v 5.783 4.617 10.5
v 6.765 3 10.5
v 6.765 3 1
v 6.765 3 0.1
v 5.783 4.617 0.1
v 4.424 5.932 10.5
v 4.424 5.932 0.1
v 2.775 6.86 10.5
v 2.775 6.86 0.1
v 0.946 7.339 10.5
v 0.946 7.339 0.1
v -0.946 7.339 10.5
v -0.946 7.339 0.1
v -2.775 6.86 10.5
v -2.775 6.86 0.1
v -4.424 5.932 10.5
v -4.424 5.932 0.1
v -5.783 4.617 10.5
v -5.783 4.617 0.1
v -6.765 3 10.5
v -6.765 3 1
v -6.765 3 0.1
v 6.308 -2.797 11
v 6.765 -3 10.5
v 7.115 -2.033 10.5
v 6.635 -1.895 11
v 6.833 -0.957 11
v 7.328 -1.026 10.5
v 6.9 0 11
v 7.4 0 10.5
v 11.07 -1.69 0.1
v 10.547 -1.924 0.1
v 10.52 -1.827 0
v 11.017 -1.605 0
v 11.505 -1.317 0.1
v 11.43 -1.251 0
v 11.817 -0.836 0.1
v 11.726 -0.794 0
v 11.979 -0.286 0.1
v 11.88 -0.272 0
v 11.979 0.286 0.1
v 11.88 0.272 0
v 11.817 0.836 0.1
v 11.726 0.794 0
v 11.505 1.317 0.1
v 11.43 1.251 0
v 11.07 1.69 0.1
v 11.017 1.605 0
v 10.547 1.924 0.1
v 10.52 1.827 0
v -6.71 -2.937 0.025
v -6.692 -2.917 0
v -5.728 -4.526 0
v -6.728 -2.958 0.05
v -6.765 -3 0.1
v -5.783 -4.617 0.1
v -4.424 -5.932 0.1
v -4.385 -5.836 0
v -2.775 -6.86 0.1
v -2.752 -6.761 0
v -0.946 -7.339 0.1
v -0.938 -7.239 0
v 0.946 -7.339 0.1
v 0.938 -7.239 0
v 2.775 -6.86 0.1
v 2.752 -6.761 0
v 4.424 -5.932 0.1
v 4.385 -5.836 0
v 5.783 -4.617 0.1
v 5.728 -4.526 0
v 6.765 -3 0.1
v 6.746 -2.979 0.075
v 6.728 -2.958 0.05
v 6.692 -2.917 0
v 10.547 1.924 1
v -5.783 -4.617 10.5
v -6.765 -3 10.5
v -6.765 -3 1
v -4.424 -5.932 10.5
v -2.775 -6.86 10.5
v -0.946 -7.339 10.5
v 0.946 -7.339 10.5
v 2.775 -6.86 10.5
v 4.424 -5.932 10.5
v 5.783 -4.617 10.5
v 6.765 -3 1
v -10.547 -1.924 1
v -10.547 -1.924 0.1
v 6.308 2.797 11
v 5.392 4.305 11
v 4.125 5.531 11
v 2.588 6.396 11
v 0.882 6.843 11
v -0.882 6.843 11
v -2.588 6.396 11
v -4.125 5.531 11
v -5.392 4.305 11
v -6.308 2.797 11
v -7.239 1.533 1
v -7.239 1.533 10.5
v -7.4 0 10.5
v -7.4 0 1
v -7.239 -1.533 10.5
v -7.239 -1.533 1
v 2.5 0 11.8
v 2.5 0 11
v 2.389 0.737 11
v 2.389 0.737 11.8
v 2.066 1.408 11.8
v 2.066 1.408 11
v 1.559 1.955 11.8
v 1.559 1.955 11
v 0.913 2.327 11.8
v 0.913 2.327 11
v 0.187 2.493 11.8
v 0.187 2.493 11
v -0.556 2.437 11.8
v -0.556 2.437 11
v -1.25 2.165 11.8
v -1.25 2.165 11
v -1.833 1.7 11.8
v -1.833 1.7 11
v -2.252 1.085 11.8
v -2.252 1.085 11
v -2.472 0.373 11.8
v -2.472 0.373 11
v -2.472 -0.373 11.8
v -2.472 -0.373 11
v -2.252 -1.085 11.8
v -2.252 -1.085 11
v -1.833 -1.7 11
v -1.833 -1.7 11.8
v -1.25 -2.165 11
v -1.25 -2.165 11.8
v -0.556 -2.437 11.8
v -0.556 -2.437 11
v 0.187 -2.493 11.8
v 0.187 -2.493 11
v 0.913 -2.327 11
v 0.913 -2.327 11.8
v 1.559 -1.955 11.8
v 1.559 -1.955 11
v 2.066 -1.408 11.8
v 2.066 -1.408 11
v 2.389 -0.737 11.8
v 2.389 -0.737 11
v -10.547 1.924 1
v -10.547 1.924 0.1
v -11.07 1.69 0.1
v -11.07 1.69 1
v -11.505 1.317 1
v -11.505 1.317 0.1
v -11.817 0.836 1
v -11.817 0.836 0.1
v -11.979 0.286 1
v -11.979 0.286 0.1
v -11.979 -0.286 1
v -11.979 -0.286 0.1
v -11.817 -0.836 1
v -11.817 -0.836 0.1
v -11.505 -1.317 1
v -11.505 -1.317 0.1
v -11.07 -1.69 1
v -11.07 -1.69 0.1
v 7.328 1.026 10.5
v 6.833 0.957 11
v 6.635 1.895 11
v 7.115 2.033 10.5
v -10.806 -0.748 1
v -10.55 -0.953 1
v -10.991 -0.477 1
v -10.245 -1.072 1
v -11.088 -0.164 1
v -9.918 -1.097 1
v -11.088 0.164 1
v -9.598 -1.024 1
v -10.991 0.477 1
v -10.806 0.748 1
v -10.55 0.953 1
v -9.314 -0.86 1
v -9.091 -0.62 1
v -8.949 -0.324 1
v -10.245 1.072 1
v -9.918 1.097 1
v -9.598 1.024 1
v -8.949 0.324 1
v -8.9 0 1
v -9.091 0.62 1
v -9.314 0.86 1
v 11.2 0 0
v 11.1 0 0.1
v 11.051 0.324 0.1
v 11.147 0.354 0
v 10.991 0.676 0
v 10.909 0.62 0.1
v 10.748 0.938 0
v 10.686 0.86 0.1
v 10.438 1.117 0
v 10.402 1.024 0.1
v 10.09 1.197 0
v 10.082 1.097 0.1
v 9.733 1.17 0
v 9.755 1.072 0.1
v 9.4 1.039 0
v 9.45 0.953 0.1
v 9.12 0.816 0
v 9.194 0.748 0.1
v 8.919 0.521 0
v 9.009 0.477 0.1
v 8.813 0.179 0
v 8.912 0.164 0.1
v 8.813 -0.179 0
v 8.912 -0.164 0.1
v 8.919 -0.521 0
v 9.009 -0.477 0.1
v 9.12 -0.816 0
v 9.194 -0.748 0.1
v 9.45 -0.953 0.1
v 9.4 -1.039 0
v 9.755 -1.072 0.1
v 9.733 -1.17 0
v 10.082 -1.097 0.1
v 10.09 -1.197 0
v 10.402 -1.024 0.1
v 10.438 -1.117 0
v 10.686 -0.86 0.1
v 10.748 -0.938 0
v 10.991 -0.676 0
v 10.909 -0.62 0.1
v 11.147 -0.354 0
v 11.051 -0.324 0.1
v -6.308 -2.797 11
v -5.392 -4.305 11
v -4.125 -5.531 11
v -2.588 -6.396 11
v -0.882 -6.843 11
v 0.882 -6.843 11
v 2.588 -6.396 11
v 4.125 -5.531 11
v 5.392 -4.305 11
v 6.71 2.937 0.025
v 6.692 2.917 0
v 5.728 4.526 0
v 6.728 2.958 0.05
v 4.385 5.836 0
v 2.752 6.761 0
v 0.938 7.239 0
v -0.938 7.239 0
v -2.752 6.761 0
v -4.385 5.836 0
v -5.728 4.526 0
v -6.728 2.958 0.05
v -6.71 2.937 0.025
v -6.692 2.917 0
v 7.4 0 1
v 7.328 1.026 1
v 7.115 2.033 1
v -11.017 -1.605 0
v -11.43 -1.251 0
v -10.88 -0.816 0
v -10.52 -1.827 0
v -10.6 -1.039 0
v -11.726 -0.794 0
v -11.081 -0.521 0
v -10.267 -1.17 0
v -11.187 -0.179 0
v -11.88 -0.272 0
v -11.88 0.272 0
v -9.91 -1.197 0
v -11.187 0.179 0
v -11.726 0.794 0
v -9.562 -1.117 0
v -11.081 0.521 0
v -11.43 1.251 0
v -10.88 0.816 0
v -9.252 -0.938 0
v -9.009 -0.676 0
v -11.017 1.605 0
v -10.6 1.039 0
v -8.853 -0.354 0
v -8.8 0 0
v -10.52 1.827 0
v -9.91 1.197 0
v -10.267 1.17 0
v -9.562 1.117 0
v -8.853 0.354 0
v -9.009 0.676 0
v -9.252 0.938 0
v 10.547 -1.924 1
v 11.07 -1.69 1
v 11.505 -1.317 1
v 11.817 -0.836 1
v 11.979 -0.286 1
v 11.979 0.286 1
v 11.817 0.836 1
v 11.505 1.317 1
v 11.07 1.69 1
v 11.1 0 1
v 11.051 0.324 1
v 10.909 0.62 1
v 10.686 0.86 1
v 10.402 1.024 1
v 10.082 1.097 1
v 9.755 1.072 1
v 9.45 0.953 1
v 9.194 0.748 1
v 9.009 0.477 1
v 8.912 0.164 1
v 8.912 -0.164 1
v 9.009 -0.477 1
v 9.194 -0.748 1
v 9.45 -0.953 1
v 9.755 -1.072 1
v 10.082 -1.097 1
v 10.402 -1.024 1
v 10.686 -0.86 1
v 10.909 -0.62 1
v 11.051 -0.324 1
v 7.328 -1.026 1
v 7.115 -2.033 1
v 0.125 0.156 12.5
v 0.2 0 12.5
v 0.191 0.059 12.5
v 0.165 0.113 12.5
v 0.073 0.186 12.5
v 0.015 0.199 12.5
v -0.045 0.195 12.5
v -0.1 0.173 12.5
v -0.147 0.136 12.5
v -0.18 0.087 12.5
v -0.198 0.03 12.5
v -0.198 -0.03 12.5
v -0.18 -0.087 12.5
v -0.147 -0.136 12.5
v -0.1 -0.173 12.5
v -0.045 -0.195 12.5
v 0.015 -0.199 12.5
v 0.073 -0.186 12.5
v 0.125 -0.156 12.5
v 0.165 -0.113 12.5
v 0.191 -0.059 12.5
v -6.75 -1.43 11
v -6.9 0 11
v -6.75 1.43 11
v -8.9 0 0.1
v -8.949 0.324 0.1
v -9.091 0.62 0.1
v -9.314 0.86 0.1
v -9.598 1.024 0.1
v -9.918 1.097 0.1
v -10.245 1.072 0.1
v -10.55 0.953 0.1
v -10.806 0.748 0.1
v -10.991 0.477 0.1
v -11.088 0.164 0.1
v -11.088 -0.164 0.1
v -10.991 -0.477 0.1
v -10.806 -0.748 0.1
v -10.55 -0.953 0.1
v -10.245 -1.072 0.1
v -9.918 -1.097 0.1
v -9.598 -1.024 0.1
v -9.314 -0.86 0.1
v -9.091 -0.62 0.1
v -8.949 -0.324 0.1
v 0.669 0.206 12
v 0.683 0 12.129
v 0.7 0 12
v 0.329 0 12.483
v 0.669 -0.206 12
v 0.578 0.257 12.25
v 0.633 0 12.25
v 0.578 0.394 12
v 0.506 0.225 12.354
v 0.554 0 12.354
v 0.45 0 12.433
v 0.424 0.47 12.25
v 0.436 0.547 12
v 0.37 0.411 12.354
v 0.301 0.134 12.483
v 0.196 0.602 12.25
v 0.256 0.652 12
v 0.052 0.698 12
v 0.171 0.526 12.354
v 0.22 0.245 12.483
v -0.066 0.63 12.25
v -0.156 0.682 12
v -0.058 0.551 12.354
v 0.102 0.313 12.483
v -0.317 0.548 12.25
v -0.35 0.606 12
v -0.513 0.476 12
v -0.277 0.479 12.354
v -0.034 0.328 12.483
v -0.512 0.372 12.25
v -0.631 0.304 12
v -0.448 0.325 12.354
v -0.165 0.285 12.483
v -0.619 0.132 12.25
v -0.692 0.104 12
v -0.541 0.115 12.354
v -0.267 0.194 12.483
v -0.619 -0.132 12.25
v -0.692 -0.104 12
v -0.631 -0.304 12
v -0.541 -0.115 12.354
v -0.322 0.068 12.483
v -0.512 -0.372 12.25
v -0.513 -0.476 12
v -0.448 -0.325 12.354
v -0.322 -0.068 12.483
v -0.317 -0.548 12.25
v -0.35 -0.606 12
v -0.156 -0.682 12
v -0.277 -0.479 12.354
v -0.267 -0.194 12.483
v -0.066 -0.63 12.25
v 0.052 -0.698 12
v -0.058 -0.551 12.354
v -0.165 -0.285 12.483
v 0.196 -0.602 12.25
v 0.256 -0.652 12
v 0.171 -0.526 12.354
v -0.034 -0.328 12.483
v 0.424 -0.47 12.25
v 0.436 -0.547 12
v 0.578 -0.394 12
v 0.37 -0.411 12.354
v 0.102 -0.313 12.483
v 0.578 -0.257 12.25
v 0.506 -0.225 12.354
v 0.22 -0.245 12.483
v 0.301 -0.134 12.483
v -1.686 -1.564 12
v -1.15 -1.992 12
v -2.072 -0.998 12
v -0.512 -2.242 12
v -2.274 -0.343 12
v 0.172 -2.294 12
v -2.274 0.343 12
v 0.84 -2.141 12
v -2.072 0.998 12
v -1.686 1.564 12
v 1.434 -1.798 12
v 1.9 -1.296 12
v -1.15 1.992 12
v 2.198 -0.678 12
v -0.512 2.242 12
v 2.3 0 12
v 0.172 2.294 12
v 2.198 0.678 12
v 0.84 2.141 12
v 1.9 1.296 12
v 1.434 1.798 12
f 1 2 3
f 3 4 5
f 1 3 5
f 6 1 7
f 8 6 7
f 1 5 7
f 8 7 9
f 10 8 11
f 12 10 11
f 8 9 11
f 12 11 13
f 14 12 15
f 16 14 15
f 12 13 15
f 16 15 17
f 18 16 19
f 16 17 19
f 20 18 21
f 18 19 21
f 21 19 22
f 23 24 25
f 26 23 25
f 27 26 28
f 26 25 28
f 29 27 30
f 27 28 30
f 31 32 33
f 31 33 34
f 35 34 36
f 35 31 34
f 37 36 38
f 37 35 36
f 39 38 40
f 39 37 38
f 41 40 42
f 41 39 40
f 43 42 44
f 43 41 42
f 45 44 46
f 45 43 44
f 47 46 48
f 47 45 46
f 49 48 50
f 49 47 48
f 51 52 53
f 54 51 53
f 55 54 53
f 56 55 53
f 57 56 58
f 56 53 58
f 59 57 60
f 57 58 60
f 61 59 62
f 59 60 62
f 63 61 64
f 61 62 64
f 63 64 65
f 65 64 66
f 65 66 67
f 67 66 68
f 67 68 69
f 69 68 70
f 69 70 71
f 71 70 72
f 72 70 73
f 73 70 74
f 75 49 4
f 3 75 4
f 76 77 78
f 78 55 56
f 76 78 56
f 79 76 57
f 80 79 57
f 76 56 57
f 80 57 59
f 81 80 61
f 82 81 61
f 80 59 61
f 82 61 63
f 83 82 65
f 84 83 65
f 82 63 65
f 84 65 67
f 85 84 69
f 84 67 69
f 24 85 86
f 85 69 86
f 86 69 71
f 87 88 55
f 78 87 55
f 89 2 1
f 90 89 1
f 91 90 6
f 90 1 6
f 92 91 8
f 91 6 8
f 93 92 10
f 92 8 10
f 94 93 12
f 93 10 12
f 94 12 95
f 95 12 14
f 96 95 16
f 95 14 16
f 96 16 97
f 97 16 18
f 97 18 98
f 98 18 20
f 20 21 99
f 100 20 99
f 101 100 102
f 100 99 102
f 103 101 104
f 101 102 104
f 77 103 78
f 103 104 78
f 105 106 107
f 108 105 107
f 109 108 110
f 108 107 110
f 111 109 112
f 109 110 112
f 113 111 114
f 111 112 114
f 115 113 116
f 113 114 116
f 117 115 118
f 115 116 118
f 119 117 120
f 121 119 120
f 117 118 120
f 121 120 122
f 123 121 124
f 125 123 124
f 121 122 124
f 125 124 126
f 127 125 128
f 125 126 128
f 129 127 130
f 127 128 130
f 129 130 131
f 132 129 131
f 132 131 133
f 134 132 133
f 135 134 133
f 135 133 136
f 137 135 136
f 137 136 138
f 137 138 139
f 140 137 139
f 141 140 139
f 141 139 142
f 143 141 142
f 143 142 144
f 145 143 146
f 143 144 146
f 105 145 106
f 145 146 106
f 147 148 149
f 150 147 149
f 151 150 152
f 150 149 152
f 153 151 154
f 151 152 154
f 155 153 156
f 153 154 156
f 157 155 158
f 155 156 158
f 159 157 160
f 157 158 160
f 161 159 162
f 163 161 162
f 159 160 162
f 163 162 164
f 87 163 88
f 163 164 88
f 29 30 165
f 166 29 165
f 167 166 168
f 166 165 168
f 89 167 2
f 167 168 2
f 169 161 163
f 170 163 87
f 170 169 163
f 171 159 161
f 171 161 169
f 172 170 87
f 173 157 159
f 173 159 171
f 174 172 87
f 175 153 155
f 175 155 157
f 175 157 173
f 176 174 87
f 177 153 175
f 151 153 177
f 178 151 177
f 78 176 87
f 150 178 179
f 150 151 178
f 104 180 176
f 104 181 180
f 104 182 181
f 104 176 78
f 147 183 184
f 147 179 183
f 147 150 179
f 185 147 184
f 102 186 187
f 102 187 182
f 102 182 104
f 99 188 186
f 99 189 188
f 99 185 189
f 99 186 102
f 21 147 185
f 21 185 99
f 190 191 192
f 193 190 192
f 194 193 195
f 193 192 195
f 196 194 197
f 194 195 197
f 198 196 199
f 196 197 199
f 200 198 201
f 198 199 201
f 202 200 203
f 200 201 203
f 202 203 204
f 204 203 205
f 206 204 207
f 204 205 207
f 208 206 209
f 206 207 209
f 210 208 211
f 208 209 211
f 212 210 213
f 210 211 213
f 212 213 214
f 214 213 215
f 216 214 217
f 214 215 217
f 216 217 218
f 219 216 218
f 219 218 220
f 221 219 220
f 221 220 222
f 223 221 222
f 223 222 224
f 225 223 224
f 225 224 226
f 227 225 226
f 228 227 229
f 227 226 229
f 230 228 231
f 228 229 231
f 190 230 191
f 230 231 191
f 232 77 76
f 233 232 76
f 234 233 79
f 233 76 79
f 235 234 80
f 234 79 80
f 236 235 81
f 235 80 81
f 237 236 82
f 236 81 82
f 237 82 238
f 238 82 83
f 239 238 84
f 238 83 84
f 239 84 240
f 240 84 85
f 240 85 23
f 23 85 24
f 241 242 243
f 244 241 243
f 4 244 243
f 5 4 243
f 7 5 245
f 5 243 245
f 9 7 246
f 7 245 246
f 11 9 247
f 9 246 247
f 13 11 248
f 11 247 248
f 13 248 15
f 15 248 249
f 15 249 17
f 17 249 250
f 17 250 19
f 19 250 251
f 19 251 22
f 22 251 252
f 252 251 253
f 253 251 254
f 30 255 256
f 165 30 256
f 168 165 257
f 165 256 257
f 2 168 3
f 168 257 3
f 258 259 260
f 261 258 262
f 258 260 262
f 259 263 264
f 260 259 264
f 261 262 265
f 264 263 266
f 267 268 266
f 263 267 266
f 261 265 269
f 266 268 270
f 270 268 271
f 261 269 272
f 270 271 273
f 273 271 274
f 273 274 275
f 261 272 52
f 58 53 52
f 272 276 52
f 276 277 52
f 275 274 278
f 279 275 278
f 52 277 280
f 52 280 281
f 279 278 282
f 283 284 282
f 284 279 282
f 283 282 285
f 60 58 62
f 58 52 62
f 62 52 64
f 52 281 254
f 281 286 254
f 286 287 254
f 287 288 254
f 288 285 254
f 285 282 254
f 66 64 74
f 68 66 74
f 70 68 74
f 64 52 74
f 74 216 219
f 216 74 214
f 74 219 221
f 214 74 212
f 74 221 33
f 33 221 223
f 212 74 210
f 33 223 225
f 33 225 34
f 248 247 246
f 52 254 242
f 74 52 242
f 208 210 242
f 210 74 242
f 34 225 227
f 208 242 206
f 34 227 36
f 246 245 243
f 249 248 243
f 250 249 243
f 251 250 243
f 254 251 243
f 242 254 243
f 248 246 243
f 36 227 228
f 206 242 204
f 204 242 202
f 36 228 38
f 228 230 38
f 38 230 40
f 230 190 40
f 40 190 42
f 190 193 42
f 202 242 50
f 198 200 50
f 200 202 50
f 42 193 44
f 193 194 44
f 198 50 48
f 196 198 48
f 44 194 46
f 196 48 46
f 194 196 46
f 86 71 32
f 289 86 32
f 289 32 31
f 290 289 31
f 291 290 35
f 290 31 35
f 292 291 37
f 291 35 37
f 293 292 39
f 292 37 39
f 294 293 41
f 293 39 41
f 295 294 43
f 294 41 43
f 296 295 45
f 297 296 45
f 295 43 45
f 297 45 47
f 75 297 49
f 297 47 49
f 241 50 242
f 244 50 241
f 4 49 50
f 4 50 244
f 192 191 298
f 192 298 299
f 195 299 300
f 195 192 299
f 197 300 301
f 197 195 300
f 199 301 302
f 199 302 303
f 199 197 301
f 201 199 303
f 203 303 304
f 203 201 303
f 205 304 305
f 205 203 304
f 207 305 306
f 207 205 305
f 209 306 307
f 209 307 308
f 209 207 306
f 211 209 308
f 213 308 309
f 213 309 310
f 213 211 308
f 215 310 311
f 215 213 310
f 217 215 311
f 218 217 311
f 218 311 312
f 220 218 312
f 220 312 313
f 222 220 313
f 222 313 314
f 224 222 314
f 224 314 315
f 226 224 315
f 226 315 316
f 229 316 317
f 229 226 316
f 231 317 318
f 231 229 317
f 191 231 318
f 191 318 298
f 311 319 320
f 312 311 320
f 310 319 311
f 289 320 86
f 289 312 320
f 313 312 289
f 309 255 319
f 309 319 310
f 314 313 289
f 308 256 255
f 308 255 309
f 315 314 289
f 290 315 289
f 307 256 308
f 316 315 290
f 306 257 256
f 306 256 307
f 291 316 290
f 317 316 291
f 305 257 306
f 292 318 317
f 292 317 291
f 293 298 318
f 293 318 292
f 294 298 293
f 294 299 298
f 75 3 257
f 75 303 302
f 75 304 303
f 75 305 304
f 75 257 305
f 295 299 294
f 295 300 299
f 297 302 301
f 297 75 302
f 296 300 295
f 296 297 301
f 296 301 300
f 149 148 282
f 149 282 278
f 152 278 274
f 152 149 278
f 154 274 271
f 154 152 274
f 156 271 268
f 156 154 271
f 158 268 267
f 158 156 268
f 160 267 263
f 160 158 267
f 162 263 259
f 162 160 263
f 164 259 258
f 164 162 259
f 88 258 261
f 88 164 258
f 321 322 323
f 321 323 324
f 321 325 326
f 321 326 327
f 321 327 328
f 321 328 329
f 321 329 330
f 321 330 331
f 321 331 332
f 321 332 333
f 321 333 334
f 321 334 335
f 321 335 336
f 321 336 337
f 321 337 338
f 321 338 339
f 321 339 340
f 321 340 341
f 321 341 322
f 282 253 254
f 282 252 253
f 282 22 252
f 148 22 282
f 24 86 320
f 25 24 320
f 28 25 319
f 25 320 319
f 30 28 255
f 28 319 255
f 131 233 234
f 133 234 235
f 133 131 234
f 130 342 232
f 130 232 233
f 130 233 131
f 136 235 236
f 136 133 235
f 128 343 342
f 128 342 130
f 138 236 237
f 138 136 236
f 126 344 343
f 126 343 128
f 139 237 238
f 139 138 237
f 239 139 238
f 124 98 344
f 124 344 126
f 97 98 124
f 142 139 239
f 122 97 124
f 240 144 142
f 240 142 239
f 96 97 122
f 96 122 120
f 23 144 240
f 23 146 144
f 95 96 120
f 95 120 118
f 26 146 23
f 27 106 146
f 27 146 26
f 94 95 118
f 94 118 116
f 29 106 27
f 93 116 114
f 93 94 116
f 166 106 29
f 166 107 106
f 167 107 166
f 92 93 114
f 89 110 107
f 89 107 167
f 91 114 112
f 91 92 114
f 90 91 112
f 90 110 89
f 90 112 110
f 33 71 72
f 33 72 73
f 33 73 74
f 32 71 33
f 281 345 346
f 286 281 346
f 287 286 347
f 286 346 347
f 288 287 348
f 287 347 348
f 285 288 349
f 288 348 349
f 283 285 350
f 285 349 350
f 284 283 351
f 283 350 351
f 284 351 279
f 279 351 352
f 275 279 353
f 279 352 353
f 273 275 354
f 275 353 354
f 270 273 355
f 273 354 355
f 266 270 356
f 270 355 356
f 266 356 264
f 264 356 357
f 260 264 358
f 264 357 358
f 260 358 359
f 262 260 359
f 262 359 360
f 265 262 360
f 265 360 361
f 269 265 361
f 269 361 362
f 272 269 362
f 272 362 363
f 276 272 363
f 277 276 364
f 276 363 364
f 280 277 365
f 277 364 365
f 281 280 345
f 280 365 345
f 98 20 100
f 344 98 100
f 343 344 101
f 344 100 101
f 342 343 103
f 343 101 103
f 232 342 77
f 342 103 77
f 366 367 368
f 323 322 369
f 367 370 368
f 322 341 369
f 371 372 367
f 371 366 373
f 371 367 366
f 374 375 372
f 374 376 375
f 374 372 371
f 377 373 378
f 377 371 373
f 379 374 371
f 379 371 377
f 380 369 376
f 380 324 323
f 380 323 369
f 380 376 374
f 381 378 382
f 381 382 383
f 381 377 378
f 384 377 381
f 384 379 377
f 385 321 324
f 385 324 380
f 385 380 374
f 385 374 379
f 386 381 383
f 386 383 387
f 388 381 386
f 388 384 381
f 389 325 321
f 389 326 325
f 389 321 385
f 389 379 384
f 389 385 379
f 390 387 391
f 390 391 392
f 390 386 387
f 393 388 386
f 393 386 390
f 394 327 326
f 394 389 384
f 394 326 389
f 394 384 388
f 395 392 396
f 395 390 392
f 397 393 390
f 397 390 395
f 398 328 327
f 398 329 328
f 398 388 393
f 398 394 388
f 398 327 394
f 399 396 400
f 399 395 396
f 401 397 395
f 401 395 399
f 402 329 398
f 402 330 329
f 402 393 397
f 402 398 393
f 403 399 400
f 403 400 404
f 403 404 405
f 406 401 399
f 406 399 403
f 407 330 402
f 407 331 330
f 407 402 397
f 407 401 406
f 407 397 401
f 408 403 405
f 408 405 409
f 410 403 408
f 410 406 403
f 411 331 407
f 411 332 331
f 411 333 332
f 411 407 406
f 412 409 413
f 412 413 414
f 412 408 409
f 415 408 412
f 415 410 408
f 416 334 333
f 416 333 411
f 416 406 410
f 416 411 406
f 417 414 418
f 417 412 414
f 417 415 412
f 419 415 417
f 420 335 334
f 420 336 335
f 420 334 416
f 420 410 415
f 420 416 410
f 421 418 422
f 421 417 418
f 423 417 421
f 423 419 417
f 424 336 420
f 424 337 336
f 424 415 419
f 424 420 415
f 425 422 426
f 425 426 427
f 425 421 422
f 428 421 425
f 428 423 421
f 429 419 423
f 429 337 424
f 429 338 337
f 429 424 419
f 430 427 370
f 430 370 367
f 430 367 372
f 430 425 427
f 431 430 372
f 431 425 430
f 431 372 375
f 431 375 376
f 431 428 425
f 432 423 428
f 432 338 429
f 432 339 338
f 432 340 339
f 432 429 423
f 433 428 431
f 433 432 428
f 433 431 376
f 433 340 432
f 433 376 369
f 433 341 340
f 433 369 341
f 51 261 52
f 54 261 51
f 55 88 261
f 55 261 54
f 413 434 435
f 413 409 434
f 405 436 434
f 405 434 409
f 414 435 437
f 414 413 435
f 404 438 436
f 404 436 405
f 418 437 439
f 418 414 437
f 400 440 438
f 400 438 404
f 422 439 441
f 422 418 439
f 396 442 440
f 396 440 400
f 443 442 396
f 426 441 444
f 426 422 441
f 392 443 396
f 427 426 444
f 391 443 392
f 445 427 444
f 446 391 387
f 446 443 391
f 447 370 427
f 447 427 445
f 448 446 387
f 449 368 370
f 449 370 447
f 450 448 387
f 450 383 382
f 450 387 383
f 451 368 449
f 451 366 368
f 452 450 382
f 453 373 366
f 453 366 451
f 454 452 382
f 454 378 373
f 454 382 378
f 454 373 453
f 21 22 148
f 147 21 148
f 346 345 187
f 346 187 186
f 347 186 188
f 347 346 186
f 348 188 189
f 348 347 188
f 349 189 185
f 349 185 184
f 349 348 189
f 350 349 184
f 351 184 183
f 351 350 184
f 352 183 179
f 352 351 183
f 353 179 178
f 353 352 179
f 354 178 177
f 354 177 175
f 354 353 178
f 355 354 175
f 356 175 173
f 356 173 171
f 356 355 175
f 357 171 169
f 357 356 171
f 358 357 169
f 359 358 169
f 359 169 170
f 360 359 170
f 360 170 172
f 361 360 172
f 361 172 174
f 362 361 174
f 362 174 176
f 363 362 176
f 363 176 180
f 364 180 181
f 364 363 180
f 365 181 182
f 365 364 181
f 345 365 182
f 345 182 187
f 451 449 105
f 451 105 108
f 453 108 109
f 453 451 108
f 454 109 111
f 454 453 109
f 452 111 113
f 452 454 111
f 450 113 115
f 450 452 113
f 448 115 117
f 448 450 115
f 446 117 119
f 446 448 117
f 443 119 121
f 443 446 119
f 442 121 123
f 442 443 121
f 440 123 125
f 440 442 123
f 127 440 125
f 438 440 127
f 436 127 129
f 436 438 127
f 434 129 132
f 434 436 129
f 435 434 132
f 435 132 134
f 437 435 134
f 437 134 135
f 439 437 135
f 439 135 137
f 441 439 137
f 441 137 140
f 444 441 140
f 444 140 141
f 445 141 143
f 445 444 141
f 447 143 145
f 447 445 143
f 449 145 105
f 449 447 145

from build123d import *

# Parameters (mm, degrees)
F0_R     = 1.1
F1_DEPTH = 1
F3_DEPTH = 10
F4_R     = 2.5
F5_DEPTH = 1
F6_R     = 0.7
F7_DEPTH = 0.5
F8_R     = 0.49999
F9_SIZE  = 0.5
F10_SIZE = 0.1
F11_SIZE = 0.2


# Not quite as in the source:
# - a fillet or chamfer is up to 0.001 mm smaller than in the source, because OpenCascade refuses the exact size


with BuildPart() as f1:
    # F0 (on Top) → F1 (new body)
    with BuildSketch(Plane.XY):
        with BuildLine():
            ThreePointArc((-10.5473609378, 1.9236413397), (-12, 0), (-10.5473609378, -1.9236413397))
            Line((-10.5473609378, -1.9236413397), (-6.7646138101, -3))
            ThreePointArc((-6.7646138101, -3), (0, -7.4), (6.7646138101, -3))
            Line((6.7646138101, -3), (10.5473609378, -1.9236413397))
            ThreePointArc((10.5473609378, -1.9236413397), (12, 0), (10.5473609378, 1.9236413397))
            Line((10.5473609378, 1.9236413397), (6.7646138101, 3))
            ThreePointArc((6.7646138101, 3), (0, 7.4), (-6.7646138101, 3))
            Line((-6.7646138101, 3), (-10.5473609378, 1.9236413397))
        make_face()
        with Locations((-10, 0)):
            Circle(F0_R, mode=Mode.SUBTRACT)
        with Locations((10, 0)):
            Circle(F0_R, mode=Mode.SUBTRACT)
    extrude(amount=F1_DEPTH)

    # F2 (on face) → F3 (join)
    with BuildSketch(Plane.XY.offset(1)):
        with BuildLine():
            ThreePointArc((6.7646138101, -3), (7.2394109634, -1.5332739164), (7.4, 0))
            ThreePointArc((7.4, 0), (7.2394109634, 1.5332739164), (6.7646138101, 3))
            ThreePointArc((6.7646138101, 3), (0, 7.4), (-6.7646138101, 3))
            ThreePointArc((-6.7646138101, 3), (-7.4, 0), (-6.7646138101, -3))
            ThreePointArc((-6.7646138101, -3), (0, -7.4), (6.7646138101, -3))
        make_face()
    extrude(amount=F3_DEPTH)

    # F4 (on face) → F5 (join)
    with BuildSketch(Plane.XY.offset(11)):
        Circle(F4_R)
    extrude(amount=F5_DEPTH)

    # F6 (on face) → F7 (join)
    with BuildSketch(Plane.XY.offset(12)):
        Circle(F6_R)
    extrude(amount=F7_DEPTH)

    # F8 (radius 0.5 in the source; OpenCascade refuses exactly that, so slightly less here)
    f8_edges = [f1.edges().sort_by_distance(p)[0] for p in [
        (-0.7, 0, 12.5),
    ]]
    fillet(f8_edges, radius=F8_R)

    # F9
    f9_edges = [f1.edges().sort_by_distance(p)[0] for p in [
        (-7.4, 0, 11),
    ]]
    chamfer(f9_edges, length=F9_SIZE)

    # F10
    f10_edges = [f1.edges().sort_by_distance(p)[0] for p in [
        (-8.655987, 2.461821, 0),
        (-12, 0, 0),
        (-8.655987, -2.461821, 0),
        (0, -7.4, 0),
        (8.655987, -2.461821, 0),
        (12, 0, 0),
        (8.655987, 2.461821, 0),
        (0, 7.4, 0),
        (-11.1, 0, 0),
        (8.9, 0, 0),
    ]]
    chamfer(f10_edges, length=F10_SIZE)

    # F11
    f11_edges = [f1.edges().sort_by_distance(p)[0] for p in [
        (-2.5, 0, 12),
    ]]
    chamfer(f11_edges, length=F11_SIZE)


solid = f1.part
